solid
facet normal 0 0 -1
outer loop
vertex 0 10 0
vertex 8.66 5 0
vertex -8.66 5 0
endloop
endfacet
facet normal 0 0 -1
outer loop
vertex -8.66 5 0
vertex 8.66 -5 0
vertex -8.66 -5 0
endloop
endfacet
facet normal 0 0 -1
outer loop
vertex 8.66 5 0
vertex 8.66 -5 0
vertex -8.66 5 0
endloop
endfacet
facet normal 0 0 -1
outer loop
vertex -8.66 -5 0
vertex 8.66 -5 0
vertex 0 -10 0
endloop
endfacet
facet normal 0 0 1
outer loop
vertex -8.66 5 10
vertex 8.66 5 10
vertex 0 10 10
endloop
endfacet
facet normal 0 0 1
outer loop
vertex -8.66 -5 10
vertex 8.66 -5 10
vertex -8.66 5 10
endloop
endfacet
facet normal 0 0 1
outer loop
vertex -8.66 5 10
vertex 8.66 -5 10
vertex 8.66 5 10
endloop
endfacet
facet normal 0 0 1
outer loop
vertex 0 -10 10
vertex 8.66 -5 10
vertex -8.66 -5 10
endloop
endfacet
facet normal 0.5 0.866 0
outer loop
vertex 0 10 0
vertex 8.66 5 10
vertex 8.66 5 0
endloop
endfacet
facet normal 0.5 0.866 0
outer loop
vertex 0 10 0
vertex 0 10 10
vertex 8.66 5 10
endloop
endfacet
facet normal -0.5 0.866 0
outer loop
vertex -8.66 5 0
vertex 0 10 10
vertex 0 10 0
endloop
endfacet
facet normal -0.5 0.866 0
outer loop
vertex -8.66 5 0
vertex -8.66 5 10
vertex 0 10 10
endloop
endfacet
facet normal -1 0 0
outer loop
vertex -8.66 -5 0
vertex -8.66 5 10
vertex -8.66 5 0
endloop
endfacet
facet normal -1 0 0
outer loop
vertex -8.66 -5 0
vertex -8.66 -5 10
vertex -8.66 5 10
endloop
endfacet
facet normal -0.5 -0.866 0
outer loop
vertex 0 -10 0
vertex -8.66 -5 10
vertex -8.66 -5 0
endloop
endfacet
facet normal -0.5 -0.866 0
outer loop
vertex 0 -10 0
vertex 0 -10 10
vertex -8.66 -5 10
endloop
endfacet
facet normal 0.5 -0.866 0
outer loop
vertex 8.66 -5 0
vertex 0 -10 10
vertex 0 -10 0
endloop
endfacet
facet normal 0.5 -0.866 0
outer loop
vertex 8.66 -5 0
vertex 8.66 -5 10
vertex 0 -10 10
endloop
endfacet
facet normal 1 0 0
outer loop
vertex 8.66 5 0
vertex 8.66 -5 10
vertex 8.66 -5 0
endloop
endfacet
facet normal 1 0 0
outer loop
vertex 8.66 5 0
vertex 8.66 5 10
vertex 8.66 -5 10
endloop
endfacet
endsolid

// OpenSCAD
module extruding_hexgon(height = 4, radius = 5, center = false) {
  linear_extrude(height = height, center=center) {
      rotate([0, 0, 30])
        circle(r=radius, $fn=6);
  }
}

extruding_hexgon(10, 10);
